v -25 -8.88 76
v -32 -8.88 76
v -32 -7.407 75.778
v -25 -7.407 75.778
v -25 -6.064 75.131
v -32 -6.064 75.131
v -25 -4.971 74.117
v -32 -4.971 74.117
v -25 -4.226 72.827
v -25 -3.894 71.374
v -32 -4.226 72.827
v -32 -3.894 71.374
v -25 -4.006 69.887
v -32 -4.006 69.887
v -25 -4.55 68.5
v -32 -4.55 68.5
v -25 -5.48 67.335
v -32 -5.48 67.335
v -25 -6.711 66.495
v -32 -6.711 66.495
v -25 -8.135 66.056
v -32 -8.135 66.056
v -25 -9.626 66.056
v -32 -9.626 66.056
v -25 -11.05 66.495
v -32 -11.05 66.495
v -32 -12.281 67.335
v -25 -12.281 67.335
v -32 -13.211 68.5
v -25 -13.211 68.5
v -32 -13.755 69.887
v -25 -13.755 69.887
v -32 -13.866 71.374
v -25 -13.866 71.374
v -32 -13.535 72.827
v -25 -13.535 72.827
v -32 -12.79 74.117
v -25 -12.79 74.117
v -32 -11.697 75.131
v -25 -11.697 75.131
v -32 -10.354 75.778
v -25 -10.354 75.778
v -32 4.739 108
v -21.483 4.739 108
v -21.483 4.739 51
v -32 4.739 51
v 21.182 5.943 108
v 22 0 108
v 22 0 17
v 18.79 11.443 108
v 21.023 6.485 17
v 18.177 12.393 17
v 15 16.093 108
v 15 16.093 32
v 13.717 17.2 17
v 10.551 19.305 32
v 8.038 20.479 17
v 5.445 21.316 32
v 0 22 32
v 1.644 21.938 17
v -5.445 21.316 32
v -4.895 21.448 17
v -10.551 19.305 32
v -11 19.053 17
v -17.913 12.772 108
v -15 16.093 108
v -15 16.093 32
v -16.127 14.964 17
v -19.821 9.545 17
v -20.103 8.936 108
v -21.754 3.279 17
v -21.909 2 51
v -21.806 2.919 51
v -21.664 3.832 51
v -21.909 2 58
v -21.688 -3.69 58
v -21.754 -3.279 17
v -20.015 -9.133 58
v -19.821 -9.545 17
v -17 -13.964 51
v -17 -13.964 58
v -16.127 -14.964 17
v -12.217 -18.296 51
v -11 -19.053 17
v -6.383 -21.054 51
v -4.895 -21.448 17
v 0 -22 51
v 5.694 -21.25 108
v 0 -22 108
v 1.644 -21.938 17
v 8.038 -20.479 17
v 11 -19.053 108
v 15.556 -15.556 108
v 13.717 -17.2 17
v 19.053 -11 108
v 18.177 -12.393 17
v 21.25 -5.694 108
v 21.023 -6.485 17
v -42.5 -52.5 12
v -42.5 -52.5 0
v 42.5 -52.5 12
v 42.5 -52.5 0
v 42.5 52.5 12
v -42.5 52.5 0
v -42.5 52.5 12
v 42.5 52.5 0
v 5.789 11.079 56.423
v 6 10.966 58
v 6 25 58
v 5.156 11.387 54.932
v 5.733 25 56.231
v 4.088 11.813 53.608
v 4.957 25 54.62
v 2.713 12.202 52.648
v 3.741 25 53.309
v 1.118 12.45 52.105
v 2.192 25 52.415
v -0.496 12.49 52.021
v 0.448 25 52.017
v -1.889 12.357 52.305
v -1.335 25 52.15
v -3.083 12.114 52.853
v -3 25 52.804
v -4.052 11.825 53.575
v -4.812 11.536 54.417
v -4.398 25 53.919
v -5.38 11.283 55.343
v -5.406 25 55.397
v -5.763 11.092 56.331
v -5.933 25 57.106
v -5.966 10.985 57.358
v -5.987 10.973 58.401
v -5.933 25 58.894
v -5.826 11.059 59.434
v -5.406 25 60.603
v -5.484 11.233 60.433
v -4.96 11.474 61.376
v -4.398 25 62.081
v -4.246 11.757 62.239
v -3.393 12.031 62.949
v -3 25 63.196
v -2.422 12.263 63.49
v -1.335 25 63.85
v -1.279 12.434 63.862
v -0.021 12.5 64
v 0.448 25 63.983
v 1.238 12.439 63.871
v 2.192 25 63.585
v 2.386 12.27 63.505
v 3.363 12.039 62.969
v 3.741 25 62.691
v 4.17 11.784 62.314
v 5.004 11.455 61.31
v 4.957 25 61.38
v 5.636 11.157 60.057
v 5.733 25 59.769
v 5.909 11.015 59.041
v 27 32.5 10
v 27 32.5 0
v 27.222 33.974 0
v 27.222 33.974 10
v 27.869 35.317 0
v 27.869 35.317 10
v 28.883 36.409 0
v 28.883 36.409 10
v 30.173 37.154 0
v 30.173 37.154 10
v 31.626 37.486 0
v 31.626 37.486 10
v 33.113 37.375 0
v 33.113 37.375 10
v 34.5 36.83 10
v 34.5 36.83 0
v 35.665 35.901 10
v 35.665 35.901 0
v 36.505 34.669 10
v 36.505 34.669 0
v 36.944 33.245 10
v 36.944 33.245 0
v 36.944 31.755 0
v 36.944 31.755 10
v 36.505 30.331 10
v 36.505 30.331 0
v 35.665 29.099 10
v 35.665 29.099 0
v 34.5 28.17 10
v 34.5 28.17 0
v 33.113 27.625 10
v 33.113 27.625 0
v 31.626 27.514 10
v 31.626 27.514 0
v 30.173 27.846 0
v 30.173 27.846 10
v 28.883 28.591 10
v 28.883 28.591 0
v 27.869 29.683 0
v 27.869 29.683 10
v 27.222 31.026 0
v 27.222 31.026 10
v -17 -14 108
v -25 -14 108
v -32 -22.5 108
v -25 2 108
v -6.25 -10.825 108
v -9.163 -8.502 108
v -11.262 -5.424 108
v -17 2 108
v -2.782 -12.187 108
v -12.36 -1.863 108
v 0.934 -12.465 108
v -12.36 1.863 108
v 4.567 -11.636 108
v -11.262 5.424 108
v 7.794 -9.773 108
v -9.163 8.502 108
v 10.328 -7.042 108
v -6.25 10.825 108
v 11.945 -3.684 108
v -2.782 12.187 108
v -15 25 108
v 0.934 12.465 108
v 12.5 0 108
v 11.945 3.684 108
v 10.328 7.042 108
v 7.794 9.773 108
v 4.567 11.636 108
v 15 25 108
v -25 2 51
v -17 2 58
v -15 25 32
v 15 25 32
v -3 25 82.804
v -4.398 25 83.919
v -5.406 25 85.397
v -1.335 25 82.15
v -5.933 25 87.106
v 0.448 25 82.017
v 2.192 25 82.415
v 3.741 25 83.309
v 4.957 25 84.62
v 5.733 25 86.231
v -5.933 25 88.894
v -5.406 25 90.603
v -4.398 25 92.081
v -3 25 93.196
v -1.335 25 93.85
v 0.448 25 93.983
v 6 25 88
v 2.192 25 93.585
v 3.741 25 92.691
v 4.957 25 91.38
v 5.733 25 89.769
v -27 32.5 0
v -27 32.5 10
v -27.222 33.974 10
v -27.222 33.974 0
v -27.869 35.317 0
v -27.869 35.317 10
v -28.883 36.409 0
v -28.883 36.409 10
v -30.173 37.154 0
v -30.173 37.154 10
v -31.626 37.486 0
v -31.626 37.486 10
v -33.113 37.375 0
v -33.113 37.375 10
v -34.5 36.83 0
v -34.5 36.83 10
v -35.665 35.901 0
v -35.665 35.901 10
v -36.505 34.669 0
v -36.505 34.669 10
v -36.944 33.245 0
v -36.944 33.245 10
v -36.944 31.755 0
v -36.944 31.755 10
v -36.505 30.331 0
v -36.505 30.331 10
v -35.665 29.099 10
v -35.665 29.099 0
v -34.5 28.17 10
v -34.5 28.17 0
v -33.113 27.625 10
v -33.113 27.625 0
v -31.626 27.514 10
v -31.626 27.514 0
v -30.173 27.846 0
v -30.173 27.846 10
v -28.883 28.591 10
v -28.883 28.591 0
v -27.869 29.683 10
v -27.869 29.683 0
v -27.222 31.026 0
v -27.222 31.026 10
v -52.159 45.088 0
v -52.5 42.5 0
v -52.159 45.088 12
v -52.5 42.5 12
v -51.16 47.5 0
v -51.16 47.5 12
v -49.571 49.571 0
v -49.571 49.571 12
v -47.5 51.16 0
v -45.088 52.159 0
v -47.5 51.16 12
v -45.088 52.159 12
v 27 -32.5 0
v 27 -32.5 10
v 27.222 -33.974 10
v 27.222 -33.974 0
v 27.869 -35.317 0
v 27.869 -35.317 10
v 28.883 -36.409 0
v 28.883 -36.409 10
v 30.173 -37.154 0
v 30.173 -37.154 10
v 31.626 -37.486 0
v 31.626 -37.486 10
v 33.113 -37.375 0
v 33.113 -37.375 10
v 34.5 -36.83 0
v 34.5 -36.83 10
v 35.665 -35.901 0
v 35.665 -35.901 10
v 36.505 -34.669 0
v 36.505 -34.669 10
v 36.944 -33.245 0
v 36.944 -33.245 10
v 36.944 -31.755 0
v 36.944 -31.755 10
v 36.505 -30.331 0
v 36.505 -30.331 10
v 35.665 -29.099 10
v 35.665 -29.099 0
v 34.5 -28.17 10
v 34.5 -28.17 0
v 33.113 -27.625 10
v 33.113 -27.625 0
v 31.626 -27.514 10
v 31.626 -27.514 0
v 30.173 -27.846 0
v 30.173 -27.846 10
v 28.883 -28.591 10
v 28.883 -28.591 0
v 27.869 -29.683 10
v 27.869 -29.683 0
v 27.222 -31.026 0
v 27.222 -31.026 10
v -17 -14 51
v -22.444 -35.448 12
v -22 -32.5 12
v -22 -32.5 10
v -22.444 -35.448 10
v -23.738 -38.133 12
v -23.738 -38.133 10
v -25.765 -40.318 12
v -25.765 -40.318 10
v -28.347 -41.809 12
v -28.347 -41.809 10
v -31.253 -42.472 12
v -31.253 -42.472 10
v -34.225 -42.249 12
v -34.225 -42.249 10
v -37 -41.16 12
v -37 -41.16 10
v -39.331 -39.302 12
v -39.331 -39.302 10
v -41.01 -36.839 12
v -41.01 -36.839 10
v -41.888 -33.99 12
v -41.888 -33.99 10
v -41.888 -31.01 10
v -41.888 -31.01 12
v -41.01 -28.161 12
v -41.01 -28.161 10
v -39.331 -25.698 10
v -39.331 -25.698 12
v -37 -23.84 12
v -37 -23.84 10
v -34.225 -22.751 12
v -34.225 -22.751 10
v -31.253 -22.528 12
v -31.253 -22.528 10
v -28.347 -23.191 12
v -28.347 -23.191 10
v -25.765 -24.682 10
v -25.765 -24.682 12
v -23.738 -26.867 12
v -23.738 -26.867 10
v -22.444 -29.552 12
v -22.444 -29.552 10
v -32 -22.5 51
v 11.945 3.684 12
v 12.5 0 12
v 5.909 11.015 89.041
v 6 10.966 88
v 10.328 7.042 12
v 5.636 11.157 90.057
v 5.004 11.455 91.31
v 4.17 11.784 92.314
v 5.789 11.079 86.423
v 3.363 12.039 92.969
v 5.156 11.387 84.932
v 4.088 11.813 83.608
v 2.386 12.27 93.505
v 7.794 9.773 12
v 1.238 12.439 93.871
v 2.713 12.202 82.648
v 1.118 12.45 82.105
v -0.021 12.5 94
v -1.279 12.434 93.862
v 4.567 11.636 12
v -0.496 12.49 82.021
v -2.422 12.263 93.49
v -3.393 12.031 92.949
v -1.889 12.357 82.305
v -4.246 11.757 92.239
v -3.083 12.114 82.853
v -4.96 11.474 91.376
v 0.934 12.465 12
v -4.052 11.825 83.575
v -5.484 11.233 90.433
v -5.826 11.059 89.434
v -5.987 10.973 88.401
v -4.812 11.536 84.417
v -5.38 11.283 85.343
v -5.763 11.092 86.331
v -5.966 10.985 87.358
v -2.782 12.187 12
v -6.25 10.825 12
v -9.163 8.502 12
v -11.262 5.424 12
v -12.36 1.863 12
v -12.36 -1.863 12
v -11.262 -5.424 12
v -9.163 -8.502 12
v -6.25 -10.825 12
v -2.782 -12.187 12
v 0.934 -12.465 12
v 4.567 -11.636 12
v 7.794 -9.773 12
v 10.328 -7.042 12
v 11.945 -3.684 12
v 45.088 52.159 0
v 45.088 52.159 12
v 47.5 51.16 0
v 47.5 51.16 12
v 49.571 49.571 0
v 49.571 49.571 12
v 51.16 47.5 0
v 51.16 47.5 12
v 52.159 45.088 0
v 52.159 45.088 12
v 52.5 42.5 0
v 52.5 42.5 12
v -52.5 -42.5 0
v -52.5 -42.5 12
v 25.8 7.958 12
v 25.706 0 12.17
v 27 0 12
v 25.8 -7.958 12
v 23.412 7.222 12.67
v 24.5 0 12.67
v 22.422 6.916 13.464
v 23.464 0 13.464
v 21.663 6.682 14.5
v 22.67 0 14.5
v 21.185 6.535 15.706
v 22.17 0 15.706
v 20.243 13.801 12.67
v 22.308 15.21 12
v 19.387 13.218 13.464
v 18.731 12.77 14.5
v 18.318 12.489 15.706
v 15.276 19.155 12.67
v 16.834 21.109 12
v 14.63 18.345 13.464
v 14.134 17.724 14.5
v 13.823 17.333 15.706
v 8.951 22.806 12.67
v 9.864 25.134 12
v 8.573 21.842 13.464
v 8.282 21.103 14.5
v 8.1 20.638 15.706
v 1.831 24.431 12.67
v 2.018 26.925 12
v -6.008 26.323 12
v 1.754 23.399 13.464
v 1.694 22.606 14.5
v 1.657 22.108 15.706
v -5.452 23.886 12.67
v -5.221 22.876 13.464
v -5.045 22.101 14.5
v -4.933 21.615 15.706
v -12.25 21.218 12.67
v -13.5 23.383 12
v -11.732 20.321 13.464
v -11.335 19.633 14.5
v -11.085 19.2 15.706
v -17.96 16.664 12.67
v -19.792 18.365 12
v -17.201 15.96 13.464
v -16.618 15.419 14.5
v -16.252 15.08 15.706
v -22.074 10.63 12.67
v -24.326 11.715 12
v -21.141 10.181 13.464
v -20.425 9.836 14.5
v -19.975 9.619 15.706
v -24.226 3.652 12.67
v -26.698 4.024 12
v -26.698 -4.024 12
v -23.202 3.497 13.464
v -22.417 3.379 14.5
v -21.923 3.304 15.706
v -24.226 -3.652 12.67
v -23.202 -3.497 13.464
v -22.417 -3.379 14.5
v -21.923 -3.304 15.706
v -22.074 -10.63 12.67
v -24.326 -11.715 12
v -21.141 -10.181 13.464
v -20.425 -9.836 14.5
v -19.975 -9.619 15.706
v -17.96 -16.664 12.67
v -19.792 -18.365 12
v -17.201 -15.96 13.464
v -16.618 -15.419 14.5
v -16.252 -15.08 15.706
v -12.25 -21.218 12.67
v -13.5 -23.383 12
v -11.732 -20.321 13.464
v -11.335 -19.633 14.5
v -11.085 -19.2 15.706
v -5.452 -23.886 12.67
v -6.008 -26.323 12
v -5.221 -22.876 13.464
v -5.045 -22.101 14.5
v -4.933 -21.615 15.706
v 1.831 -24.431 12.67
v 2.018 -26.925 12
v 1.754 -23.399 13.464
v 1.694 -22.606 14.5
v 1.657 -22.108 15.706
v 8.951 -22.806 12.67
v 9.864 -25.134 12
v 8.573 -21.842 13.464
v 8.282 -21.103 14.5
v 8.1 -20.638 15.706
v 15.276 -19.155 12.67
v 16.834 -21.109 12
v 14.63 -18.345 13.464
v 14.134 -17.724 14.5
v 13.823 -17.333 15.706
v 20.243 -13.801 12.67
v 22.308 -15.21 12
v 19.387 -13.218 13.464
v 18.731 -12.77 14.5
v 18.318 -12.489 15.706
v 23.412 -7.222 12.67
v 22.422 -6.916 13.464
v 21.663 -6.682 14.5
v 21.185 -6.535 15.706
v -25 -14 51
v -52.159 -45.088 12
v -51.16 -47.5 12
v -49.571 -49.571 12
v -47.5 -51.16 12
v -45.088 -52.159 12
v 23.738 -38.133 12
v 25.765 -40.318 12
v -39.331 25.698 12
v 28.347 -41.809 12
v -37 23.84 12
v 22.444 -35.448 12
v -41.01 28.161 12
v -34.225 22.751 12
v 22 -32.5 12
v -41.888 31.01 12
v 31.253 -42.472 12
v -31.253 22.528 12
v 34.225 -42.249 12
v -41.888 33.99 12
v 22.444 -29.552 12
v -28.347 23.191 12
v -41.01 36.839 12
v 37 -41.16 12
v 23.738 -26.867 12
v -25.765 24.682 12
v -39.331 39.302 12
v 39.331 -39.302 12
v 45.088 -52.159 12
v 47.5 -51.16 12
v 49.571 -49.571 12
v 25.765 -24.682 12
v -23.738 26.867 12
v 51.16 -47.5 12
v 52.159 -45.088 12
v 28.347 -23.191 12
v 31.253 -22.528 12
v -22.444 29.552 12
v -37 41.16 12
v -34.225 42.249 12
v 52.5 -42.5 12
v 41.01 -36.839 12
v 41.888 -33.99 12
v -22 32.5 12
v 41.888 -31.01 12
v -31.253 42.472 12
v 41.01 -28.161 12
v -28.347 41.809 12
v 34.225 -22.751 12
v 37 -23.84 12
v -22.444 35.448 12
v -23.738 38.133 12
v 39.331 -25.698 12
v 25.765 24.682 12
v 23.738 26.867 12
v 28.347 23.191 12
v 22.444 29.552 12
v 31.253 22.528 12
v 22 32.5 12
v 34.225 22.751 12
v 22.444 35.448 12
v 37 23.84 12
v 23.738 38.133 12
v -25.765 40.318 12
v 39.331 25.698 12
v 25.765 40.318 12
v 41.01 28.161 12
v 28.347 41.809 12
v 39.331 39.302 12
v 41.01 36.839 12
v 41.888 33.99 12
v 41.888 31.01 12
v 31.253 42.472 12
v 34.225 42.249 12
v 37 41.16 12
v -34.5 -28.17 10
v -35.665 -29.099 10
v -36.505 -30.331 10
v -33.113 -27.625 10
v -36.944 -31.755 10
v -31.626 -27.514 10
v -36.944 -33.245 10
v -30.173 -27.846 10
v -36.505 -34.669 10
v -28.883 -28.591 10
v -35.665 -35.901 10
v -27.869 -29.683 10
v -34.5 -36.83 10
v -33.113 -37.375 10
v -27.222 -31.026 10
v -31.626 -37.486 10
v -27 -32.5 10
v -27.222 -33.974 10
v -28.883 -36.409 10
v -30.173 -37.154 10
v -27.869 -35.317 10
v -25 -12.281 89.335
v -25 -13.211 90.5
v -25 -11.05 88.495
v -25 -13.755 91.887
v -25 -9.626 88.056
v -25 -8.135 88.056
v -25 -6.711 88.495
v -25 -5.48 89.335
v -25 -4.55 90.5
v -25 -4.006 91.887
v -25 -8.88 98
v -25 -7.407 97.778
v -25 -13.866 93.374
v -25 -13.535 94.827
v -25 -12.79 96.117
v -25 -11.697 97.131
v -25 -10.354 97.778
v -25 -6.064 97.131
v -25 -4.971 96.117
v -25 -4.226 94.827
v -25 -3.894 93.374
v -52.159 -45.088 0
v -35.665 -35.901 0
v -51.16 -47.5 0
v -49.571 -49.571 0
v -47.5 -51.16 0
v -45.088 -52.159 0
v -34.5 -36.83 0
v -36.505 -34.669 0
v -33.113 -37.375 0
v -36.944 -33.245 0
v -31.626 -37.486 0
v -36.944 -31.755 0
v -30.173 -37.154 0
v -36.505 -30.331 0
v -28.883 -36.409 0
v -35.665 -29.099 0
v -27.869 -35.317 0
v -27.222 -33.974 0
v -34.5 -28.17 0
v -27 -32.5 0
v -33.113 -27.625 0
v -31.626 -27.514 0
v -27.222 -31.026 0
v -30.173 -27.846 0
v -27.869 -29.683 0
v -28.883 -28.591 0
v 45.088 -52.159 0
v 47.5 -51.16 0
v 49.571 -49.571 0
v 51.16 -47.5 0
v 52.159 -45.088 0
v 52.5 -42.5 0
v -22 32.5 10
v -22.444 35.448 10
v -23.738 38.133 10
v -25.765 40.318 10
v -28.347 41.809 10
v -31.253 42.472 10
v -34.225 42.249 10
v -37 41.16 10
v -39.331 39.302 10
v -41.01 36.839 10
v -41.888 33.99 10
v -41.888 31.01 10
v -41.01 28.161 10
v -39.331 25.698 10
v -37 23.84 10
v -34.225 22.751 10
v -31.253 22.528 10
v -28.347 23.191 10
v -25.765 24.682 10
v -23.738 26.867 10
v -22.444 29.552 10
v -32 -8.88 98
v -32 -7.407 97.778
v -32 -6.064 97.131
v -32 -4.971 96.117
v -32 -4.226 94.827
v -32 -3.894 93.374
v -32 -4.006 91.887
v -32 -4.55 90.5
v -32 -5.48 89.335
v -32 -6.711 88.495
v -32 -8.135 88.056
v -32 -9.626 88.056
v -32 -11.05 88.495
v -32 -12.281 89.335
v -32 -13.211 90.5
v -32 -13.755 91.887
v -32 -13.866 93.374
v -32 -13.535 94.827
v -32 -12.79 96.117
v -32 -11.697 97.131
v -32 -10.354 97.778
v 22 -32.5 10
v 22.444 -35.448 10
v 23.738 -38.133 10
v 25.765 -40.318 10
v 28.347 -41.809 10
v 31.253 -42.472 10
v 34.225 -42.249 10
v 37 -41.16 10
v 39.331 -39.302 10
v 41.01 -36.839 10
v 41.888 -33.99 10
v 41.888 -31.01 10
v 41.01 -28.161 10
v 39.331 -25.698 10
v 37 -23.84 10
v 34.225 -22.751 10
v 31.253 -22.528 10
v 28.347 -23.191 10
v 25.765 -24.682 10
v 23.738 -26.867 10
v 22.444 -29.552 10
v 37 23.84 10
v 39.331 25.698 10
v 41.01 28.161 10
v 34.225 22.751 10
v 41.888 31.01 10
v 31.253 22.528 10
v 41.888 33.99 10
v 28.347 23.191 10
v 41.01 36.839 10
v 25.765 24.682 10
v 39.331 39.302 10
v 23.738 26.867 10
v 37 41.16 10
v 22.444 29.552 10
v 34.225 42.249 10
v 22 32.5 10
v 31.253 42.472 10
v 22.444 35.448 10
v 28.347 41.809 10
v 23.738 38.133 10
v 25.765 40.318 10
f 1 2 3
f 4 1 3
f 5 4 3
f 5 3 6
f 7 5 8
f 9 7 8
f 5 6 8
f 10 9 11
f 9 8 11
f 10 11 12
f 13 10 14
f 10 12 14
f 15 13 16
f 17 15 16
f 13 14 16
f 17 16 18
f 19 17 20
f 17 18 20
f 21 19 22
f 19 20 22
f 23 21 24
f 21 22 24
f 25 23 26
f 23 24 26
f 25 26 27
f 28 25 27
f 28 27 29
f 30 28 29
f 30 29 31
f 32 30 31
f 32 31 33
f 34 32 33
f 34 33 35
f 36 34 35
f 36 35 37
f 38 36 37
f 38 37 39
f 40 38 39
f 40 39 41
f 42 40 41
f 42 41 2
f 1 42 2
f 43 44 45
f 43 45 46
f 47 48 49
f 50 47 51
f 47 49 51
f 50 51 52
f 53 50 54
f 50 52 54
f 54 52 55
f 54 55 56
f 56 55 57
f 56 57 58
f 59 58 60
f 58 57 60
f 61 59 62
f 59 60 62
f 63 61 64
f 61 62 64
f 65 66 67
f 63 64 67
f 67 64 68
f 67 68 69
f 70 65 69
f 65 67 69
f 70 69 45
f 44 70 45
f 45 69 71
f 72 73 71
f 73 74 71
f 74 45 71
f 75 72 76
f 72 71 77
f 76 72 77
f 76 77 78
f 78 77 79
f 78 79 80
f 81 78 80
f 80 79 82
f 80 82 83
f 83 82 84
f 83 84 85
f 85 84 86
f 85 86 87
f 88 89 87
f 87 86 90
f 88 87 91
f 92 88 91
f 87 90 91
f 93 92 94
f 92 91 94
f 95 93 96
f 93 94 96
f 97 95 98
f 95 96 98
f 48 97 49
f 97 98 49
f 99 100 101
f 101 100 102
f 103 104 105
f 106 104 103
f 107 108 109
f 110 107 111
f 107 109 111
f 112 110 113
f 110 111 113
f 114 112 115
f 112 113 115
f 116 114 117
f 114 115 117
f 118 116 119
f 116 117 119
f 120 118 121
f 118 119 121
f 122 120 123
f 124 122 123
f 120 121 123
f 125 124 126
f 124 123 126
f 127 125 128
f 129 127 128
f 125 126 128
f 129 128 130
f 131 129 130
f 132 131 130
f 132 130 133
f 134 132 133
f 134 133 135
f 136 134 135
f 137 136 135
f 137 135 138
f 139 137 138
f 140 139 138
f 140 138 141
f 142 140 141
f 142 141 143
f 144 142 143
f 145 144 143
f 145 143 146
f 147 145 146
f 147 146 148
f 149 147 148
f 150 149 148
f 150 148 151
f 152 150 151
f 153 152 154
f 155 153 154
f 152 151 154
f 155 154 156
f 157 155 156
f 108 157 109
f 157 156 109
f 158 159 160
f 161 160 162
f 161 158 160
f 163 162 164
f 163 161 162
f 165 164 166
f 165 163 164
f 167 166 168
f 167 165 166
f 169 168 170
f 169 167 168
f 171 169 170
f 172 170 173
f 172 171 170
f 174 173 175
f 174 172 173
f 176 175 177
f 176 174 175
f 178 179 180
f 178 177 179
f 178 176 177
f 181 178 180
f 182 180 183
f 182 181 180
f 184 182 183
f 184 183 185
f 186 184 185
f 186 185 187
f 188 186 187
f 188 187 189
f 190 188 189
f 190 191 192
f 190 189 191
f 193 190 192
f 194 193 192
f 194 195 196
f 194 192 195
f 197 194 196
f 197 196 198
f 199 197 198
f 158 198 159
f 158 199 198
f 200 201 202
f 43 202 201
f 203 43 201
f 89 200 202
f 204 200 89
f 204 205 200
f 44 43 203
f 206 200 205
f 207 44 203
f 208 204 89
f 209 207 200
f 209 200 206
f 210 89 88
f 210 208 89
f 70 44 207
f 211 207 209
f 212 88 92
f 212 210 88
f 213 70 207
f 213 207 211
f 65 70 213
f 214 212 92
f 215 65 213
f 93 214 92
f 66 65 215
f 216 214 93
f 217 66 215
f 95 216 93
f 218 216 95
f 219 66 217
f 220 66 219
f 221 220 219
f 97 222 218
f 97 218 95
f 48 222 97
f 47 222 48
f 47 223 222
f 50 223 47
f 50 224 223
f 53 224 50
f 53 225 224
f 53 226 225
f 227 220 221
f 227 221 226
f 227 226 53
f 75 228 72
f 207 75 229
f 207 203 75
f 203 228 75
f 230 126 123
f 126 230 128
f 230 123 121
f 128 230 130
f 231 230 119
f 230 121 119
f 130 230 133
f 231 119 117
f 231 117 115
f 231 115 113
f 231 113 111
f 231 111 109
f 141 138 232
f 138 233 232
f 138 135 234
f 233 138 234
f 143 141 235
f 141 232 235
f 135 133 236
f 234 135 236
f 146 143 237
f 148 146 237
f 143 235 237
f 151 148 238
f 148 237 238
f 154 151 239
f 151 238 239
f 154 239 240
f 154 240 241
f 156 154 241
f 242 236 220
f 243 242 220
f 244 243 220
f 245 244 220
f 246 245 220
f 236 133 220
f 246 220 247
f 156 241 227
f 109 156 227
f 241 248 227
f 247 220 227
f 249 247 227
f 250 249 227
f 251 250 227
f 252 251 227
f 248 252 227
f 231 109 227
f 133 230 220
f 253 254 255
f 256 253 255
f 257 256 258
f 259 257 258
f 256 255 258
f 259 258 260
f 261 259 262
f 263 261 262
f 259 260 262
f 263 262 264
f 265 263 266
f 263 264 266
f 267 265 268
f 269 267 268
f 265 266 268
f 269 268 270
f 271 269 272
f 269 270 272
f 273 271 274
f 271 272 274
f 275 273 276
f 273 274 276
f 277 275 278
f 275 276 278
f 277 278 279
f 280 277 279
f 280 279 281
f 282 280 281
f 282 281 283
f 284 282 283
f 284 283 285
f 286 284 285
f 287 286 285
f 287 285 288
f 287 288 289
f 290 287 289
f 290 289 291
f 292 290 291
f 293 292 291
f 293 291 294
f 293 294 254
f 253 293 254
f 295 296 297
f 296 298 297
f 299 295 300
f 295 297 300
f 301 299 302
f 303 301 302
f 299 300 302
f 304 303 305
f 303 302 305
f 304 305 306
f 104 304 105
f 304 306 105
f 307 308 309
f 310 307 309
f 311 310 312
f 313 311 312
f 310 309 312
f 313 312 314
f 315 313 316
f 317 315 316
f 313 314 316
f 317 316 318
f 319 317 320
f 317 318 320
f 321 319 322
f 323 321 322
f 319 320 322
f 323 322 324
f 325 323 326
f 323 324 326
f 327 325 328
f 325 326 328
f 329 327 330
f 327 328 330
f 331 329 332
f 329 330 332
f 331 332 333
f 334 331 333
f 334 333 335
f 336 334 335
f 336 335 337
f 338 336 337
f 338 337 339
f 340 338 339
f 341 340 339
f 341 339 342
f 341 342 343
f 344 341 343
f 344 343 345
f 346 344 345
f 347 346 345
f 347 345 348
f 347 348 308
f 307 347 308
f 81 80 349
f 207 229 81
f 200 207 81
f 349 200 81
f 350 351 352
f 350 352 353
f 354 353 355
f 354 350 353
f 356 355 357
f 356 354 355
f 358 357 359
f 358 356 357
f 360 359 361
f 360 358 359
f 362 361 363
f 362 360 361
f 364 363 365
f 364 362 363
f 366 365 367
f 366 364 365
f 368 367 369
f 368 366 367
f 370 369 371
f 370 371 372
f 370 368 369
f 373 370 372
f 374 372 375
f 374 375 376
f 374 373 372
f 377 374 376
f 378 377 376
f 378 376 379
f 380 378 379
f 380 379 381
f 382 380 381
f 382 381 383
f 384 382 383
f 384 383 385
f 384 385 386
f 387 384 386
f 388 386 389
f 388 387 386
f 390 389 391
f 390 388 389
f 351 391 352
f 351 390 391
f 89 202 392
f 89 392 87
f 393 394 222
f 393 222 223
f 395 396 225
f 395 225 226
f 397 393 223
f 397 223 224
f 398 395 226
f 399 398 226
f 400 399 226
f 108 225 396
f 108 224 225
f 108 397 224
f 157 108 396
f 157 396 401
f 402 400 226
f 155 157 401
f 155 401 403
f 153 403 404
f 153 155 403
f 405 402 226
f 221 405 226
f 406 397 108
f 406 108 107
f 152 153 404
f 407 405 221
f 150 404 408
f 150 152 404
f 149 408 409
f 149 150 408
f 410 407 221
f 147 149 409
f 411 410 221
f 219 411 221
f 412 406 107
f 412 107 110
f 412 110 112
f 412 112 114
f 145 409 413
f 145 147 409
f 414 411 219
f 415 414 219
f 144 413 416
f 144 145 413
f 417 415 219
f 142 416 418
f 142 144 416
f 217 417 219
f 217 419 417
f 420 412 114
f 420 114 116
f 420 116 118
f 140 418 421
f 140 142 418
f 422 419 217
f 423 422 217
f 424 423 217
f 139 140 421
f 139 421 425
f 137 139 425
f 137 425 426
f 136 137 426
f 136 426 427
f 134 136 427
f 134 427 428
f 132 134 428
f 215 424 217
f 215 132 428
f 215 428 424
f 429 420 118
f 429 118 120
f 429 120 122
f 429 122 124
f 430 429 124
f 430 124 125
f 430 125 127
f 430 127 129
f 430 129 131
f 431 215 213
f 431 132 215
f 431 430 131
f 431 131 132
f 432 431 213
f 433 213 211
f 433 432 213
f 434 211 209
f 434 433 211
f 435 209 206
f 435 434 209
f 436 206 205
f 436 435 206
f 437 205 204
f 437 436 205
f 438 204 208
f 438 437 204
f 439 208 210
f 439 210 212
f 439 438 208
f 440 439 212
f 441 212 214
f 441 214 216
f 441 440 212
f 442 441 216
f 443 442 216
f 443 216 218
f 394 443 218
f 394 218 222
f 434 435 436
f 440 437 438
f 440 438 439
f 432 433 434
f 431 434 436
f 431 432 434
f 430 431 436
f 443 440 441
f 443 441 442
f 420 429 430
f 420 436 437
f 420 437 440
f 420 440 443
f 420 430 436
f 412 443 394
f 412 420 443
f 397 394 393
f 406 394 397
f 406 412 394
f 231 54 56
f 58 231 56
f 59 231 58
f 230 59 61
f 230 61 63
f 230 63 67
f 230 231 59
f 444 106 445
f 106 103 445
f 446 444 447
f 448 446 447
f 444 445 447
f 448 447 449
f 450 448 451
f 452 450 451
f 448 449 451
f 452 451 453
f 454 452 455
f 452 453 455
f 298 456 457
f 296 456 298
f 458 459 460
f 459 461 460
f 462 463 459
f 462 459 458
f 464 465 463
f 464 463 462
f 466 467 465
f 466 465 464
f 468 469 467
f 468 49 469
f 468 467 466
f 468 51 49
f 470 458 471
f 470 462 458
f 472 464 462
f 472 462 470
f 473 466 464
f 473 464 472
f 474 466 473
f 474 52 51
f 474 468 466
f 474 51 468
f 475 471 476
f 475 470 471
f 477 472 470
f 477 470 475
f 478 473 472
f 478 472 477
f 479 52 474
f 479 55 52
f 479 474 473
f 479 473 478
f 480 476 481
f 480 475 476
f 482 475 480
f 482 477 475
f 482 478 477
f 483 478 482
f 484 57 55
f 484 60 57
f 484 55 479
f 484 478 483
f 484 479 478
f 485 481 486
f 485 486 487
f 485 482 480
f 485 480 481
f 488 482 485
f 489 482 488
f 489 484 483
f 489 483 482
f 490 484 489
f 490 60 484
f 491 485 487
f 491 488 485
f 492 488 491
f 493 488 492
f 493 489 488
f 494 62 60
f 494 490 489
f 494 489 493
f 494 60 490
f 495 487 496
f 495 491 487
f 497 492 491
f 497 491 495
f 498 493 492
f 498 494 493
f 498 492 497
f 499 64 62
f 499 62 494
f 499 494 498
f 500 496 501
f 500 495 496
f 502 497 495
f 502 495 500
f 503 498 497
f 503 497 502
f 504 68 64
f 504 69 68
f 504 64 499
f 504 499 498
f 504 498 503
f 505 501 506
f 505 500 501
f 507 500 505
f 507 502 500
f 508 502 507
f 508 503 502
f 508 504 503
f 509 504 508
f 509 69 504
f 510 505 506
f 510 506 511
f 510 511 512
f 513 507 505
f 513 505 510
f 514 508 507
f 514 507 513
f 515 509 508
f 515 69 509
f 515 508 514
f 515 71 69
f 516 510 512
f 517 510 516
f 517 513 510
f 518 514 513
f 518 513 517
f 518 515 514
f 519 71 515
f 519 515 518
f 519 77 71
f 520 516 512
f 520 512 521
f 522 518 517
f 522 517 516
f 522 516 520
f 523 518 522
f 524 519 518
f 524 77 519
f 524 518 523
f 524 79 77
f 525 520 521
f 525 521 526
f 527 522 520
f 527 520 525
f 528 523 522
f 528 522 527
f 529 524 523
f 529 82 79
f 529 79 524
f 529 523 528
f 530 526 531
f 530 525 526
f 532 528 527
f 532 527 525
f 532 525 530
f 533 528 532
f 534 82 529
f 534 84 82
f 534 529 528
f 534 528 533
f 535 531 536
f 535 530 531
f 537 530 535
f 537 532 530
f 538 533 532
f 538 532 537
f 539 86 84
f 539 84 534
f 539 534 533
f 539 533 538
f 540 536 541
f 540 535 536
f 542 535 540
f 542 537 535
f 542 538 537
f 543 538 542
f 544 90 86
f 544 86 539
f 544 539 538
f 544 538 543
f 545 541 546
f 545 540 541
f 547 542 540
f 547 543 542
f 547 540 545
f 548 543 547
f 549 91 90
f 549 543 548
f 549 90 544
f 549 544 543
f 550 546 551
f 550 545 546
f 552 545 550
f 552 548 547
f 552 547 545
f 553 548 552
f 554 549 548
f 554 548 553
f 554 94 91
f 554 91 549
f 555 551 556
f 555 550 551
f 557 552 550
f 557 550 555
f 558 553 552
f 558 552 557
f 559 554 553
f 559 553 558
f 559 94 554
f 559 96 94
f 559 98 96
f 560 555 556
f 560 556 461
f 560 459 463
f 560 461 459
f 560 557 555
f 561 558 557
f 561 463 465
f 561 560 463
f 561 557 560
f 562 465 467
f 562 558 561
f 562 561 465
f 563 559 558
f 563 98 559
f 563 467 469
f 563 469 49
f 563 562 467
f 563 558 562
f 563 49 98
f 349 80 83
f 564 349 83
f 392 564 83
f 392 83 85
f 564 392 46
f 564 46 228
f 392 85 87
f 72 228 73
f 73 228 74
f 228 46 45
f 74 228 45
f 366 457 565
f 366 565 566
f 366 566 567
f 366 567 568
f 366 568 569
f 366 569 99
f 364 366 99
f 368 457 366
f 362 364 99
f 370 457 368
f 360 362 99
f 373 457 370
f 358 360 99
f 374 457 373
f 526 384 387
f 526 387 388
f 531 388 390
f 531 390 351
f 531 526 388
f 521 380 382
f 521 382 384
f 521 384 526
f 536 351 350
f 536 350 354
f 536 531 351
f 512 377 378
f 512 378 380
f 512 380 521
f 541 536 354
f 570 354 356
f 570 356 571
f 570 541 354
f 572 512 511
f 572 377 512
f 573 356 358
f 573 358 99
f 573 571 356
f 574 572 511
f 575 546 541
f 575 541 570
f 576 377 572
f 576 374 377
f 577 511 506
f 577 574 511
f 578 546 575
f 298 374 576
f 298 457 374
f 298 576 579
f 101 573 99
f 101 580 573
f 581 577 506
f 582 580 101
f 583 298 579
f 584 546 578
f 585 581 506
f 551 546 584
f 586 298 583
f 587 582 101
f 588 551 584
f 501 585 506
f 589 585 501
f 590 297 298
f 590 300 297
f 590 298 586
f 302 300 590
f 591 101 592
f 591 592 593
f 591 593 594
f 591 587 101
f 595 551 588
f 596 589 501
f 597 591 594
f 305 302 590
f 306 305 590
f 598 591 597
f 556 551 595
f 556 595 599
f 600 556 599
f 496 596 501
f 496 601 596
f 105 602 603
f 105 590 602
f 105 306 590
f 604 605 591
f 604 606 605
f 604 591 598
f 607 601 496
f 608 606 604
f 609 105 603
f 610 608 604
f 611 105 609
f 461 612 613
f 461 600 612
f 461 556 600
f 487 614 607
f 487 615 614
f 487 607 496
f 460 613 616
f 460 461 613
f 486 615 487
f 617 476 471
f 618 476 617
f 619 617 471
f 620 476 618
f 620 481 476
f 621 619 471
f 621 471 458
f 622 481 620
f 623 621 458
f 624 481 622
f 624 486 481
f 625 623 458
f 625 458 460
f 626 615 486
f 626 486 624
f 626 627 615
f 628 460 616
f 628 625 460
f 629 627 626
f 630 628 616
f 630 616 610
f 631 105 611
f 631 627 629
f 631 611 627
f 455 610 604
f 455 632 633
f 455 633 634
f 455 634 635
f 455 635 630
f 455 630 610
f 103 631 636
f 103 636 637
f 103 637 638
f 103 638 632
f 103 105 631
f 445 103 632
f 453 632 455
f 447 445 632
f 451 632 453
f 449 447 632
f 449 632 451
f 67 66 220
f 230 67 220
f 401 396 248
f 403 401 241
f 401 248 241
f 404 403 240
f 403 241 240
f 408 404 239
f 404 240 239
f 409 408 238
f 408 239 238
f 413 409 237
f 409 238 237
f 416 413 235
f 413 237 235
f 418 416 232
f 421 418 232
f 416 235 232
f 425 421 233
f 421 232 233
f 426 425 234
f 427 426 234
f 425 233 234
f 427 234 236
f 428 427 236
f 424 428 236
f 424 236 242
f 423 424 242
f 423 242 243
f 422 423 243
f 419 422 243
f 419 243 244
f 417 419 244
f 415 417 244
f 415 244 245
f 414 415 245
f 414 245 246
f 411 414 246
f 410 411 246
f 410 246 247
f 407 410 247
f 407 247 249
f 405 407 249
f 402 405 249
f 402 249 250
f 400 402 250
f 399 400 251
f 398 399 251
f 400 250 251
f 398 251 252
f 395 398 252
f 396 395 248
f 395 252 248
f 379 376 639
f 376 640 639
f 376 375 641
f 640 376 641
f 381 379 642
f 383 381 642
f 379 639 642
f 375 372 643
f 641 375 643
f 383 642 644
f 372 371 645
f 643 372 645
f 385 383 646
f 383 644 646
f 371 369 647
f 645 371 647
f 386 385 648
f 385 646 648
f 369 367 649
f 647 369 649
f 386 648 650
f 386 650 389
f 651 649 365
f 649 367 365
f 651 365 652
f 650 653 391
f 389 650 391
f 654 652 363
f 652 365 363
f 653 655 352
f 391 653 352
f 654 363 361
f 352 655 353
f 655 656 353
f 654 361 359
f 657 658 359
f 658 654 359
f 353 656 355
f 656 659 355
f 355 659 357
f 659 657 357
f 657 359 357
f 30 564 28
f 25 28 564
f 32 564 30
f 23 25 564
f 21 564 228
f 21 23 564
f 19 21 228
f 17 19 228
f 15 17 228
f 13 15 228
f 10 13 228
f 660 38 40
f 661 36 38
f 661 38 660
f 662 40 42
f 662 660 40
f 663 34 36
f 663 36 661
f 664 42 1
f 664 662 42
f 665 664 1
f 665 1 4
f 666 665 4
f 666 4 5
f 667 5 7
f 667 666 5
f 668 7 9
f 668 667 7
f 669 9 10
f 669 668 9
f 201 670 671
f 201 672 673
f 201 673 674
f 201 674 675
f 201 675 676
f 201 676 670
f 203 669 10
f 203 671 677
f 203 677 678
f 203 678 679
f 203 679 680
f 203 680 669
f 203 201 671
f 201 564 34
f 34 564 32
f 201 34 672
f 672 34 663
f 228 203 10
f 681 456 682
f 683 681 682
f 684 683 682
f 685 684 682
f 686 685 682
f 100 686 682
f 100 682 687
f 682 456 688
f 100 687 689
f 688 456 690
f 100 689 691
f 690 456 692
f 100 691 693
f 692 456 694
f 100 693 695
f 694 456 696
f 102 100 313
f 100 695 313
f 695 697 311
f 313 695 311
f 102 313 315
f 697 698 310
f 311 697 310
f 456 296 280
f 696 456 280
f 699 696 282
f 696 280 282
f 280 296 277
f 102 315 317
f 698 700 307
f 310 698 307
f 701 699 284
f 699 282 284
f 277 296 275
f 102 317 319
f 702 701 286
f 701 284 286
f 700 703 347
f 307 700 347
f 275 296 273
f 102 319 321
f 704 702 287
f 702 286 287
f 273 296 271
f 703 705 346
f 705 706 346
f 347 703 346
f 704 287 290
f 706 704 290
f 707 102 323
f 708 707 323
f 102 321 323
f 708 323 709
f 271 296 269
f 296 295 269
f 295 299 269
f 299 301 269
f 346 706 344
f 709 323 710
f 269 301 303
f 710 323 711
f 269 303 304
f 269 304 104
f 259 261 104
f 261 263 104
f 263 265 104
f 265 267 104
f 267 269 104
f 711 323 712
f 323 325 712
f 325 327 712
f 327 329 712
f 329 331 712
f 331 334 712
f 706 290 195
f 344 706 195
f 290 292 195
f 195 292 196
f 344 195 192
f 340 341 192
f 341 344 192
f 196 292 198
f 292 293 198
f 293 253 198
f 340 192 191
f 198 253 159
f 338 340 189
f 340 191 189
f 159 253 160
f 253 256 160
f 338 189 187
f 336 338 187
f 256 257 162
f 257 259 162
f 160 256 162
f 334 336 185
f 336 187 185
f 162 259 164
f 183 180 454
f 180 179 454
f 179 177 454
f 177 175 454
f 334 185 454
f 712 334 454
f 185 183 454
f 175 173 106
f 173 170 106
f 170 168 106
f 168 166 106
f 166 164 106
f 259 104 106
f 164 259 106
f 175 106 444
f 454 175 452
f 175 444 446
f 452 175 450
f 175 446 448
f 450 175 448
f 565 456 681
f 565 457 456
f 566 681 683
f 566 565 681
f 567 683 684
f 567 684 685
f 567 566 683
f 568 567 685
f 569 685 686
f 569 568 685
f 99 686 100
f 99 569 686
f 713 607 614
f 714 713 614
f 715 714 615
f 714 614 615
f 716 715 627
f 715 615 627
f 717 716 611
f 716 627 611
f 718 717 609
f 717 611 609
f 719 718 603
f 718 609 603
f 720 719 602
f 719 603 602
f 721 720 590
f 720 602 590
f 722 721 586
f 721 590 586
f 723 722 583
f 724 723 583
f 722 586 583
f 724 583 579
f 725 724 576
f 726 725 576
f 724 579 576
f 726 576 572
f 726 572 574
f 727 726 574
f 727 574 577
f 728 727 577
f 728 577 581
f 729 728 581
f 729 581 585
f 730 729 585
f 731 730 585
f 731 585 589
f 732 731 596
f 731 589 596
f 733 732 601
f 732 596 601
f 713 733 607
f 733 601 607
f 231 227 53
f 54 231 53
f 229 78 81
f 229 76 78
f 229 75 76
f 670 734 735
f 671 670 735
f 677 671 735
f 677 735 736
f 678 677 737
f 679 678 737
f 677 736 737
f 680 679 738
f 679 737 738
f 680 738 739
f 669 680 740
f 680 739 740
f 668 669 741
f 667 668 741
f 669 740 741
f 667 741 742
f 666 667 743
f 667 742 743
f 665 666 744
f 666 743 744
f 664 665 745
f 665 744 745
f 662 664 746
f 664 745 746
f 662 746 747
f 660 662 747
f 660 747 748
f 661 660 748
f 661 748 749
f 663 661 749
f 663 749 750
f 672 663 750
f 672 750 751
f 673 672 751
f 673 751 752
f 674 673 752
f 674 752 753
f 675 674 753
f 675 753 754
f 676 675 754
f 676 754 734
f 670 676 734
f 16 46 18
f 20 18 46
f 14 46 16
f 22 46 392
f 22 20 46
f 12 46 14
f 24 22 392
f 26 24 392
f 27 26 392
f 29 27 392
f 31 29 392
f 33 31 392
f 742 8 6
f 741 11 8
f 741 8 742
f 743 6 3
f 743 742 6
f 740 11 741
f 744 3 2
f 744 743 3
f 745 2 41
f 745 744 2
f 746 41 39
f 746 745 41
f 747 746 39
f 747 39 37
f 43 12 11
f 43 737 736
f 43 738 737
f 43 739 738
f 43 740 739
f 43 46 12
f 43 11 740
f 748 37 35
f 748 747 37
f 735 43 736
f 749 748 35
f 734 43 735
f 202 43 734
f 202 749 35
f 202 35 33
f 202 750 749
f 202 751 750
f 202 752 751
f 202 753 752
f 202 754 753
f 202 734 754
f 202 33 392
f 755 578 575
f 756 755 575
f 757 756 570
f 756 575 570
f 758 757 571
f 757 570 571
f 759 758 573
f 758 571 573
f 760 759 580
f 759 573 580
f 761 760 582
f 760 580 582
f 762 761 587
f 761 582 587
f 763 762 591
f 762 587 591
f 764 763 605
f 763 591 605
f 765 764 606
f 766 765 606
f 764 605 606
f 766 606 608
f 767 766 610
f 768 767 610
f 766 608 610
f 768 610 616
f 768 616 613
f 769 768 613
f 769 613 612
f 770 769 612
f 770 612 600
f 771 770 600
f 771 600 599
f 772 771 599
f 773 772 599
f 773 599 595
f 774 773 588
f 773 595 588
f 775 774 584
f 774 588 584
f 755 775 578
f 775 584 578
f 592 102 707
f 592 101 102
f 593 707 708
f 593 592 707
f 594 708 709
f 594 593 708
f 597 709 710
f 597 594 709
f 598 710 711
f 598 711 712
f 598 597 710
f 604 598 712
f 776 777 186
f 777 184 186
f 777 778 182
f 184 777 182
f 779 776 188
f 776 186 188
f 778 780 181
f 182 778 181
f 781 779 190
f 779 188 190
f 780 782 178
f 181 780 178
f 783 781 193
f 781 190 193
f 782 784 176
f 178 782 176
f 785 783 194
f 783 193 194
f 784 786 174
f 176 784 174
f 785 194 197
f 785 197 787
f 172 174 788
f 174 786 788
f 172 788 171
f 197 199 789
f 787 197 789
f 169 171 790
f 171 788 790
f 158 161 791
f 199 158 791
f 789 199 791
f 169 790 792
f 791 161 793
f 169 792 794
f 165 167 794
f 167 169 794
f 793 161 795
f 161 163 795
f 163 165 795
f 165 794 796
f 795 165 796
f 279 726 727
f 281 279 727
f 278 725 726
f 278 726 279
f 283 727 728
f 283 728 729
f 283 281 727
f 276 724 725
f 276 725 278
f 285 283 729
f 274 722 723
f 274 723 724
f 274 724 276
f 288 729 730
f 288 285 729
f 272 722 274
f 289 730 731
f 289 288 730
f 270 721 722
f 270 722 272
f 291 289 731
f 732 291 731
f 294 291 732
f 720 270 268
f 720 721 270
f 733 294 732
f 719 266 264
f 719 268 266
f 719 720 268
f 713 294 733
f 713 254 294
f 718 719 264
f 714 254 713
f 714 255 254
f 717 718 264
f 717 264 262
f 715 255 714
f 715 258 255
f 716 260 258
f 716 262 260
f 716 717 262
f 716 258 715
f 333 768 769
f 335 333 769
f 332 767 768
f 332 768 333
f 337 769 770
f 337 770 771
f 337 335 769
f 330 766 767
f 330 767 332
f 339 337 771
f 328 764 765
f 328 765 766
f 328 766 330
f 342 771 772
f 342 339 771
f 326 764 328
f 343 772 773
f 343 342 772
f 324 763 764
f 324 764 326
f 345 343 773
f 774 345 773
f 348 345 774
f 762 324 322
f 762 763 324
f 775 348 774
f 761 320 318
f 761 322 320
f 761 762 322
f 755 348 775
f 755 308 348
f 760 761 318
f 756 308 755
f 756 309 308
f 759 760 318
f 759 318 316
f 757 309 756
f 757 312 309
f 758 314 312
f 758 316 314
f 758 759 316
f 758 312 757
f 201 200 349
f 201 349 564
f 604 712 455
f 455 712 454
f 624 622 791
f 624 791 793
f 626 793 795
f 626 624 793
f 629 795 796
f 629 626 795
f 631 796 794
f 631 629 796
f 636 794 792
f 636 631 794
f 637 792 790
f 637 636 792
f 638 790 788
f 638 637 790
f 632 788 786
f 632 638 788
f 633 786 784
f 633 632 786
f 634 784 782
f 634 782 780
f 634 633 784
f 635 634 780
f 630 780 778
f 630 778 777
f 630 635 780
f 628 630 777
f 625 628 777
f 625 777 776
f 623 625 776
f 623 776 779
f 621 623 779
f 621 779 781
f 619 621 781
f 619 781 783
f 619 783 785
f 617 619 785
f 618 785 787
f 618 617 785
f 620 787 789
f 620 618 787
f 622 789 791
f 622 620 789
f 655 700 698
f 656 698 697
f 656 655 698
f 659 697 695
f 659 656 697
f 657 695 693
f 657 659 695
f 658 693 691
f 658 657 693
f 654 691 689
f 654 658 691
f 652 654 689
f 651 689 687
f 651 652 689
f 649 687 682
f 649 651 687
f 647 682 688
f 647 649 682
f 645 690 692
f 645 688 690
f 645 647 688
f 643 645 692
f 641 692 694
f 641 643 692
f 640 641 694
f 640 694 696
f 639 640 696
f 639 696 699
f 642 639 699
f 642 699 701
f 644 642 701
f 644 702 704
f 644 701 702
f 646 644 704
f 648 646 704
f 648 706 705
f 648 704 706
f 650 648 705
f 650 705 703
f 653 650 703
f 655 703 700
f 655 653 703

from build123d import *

# Parameters (mm, degrees)
SKETCH1_W               = 105
SKETCH1_H               = 105
BOSS_EXTRUDE1_DEPTH     = 12
SKETCH2_R               = 22
SKETCH2_R_2             = 12.5
BOSS_EXTRUDE2_DEPTH     = 96
FILLET1_R               = 5
SKETCH4_R               = 10
CUT_EXTRUDE2_DEPTH      = 2
SKETCH6_R               = 5
CUT_EXTRUDE3_DEPTH      = 11
MIRROR3_COPY_1_SKETCH_R = 10
MIRROR3_COPY_1_DEPTH    = 2
MIRROR3_COPY_2_SKETCH_R = 5
MIRROR3_COPY_2_DEPTH    = 11
BOSS_EXTRUDE5_DEPTH     = 57
SKETCH9_W               = 8
SKETCH9_H               = 16
CUT_EXTRUDE5_DEPTH      = 50
BOSS_EXTRUDE6_DEPTH     = 76
CUT_EXTRUDE6_REACH      = 79.5
SKETCH11_R              = 6
FILLET2_R               = 10
CUT_EXTRUDE7_REACH      = 86.5
SKETCH12_R              = 5


with BuildPart() as part:
    # Sketch1 → Boss-Extrude1 (new body)
    with BuildSketch(Plane.XY):
        Rectangle(SKETCH1_W, SKETCH1_H)
    extrude(amount=BOSS_EXTRUDE1_DEPTH)

    # Sketch2 → Boss-Extrude2 (add)
    with BuildSketch(Plane.XY.offset(12)):
        Circle(SKETCH2_R)
        Circle(SKETCH2_R_2, mode=Mode.SUBTRACT)
    extrude(amount=BOSS_EXTRUDE2_DEPTH)

    # Fillet1
    fillet1_edges = [part.edges().sort_by_distance(p)[0] for p in [
        (-22, 0, 12),
    ]]
    fillet(fillet1_edges, radius=FILLET1_R)

    # Sketch4 → Cut-Extrude2 (cut)
    with BuildSketch(Plane.XY.offset(12)):
        with Locations((-32, 32.5)):
            Circle(SKETCH4_R)
    cut_extrude2 = extrude(amount=-CUT_EXTRUDE2_DEPTH, mode=Mode.SUBTRACT)

    # Sketch6 → Cut-Extrude3 (cut, through all)
    with BuildSketch(Plane.XY.offset(10)):
        with Locations((-32, 32.5)):
            Circle(SKETCH6_R)
    cut_extrude3 = extrude(amount=-CUT_EXTRUDE3_DEPTH, mode=Mode.SUBTRACT)

    # Mirror2: Cut-Extrude2, Cut-Extrude3 across plane
    add(cut_extrude2.mirror(Plane(origin=(0, 0, 0), x_dir=(0, 0, 1), z_dir=(1, 0, 0))), mode=Mode.SUBTRACT)
    add(cut_extrude3.mirror(Plane(origin=(0, 0, 0), x_dir=(0, 0, 1), z_dir=(1, 0, 0))), mode=Mode.SUBTRACT)

    # Mirror3: Cut-Extrude3, Cut-Extrude2 across plane
    add(cut_extrude3.mirror(Plane.ZX), mode=Mode.SUBTRACT)
    add(cut_extrude2.mirror(Plane.ZX), mode=Mode.SUBTRACT)

    # Mirror3 copy 1 sketch → Mirror3 copy 1 (cut)
    with BuildSketch(Plane(origin=(0, 0, 12), x_dir=(-1, 0, 0), z_dir=(0, 0, 1))):
        with Locations((-32, 32.5)):
            Circle(MIRROR3_COPY_1_SKETCH_R)
    extrude(amount=-MIRROR3_COPY_1_DEPTH, mode=Mode.SUBTRACT)

    # Mirror3 copy 2 sketch → Mirror3 copy 2 (cut, through all)
    with BuildSketch(Plane(origin=(0, 0, 10), x_dir=(-1, 0, 0), z_dir=(0, 0, 1))):
        with Locations((-32, 32.5)):
            Circle(MIRROR3_COPY_2_SKETCH_R)
    extrude(amount=-MIRROR3_COPY_2_DEPTH, mode=Mode.SUBTRACT)

    # Sketch8 → Boss-Extrude5 (add)
    with BuildSketch(Plane.XY.offset(108)):
        with BuildLine():
            Line((-32, -22.5), (0, -22))
            ThreePointArc((0, -22), (-9.401774275, -19.889862757), (-17, -13.964240044))
            Line((-17, -13.964240044), (-17, -14))
            Line((-17, -14), (-25, -14))
            Line((-25, -14), (-25, 2))
            Line((-25, 2), (-21.9089023, 2))
            ThreePointArc((-21.9089023, 2), (-21.739374416, 3.37632937), (-21.483471943, 4.739243954))
            Line((-21.483471943, 4.739243954), (-32, 4.739243954))
            Line((-32, 4.739243954), (-32, -22.5))
        make_face()
    extrude(amount=-BOSS_EXTRUDE5_DEPTH)

    # Sketch9 → Cut-Extrude5 (cut)
    with BuildSketch(Plane.XY.offset(108)):
        with Locations((-21, -6)):
            Rectangle(SKETCH9_W, SKETCH9_H)
    extrude(amount=-CUT_EXTRUDE5_DEPTH, mode=Mode.SUBTRACT)

    # Sketch10 → Boss-Extrude6 (add)
    with BuildSketch(Plane.XY.offset(108)):
        with BuildLine():
            Line((-15, 25), (15, 25))
            Line((15, 25), (15, 16.093476939))
            ThreePointArc((15, 16.093476939), (0, 22), (-15, 16.093476939))
            Line((-15, 16.093476939), (-15, 25))
        make_face()
    extrude(amount=-BOSS_EXTRUDE6_DEPTH)

    # Sketch11 → Cut-Extrude6 (cut, up to next)
    with BuildSketch(Plane(origin=(0, 25, 0), x_dir=(1, 0, 0), z_dir=(0, 1, 0)), mode=Mode.PRIVATE) as cut_extrude6_sk1:
        with Locations((0, -88)):
            Circle(SKETCH11_R)
    cut_extrude6_tool1 = extrude(cut_extrude6_sk1.sketch, amount=-CUT_EXTRUDE6_REACH, mode=Mode.PRIVATE) & part.part
    add(cut_extrude6_tool1.solids().sort_by_distance((0, 25, 88))[0], mode=Mode.SUBTRACT)
    # Sketch11 → Cut-Extrude6 (cut, up to next)
    with BuildSketch(Plane(origin=(0, 25, 0), x_dir=(1, 0, 0), z_dir=(0, 1, 0)), mode=Mode.PRIVATE) as cut_extrude6_sk2:
        with Locations((0, -58)):
            Circle(SKETCH11_R)
    cut_extrude6_tool2 = extrude(cut_extrude6_sk2.sketch, amount=-CUT_EXTRUDE6_REACH, mode=Mode.PRIVATE) & part.part
    add(cut_extrude6_tool2.solids().sort_by_distance((0, 25, 58))[0], mode=Mode.SUBTRACT)

    # Fillet2
    fillet2_edges = [part.edges().sort_by_distance(p)[0] for p in [
        (52.5, -52.5, 6),
        (-52.5, -52.5, 6),
        (-52.5, 52.5, 6),
        (52.5, 52.5, 6),
    ]]
    fillet(fillet2_edges, radius=FILLET2_R)

    # Sketch12 → Cut-Extrude7 (cut, up to next)
    with BuildSketch(Plane.ZY.offset(32), mode=Mode.PRIVATE) as cut_extrude7_sk1:
        with Locations((93, -8.880378023)):
            Circle(SKETCH12_R)
    cut_extrude7_tool1 = extrude(cut_extrude7_sk1.sketch, amount=-CUT_EXTRUDE7_REACH, mode=Mode.PRIVATE) & part.part
    add(cut_extrude7_tool1.solids().sort_by_distance((-32, -8.880378, 93))[0], mode=Mode.SUBTRACT)
    # Sketch12 → Cut-Extrude7 (cut, up to next)
    with BuildSketch(Plane.ZY.offset(32), mode=Mode.PRIVATE) as cut_extrude7_sk2:
        with Locations((71, -8.880378023)):
            Circle(SKETCH12_R)
    cut_extrude7_tool2 = extrude(cut_extrude7_sk2.sketch, amount=-CUT_EXTRUDE7_REACH, mode=Mode.PRIVATE) & part.part
    add(cut_extrude7_tool2.solids().sort_by_distance((-32, -8.880378, 71))[0], mode=Mode.SUBTRACT)


solid = part.part
